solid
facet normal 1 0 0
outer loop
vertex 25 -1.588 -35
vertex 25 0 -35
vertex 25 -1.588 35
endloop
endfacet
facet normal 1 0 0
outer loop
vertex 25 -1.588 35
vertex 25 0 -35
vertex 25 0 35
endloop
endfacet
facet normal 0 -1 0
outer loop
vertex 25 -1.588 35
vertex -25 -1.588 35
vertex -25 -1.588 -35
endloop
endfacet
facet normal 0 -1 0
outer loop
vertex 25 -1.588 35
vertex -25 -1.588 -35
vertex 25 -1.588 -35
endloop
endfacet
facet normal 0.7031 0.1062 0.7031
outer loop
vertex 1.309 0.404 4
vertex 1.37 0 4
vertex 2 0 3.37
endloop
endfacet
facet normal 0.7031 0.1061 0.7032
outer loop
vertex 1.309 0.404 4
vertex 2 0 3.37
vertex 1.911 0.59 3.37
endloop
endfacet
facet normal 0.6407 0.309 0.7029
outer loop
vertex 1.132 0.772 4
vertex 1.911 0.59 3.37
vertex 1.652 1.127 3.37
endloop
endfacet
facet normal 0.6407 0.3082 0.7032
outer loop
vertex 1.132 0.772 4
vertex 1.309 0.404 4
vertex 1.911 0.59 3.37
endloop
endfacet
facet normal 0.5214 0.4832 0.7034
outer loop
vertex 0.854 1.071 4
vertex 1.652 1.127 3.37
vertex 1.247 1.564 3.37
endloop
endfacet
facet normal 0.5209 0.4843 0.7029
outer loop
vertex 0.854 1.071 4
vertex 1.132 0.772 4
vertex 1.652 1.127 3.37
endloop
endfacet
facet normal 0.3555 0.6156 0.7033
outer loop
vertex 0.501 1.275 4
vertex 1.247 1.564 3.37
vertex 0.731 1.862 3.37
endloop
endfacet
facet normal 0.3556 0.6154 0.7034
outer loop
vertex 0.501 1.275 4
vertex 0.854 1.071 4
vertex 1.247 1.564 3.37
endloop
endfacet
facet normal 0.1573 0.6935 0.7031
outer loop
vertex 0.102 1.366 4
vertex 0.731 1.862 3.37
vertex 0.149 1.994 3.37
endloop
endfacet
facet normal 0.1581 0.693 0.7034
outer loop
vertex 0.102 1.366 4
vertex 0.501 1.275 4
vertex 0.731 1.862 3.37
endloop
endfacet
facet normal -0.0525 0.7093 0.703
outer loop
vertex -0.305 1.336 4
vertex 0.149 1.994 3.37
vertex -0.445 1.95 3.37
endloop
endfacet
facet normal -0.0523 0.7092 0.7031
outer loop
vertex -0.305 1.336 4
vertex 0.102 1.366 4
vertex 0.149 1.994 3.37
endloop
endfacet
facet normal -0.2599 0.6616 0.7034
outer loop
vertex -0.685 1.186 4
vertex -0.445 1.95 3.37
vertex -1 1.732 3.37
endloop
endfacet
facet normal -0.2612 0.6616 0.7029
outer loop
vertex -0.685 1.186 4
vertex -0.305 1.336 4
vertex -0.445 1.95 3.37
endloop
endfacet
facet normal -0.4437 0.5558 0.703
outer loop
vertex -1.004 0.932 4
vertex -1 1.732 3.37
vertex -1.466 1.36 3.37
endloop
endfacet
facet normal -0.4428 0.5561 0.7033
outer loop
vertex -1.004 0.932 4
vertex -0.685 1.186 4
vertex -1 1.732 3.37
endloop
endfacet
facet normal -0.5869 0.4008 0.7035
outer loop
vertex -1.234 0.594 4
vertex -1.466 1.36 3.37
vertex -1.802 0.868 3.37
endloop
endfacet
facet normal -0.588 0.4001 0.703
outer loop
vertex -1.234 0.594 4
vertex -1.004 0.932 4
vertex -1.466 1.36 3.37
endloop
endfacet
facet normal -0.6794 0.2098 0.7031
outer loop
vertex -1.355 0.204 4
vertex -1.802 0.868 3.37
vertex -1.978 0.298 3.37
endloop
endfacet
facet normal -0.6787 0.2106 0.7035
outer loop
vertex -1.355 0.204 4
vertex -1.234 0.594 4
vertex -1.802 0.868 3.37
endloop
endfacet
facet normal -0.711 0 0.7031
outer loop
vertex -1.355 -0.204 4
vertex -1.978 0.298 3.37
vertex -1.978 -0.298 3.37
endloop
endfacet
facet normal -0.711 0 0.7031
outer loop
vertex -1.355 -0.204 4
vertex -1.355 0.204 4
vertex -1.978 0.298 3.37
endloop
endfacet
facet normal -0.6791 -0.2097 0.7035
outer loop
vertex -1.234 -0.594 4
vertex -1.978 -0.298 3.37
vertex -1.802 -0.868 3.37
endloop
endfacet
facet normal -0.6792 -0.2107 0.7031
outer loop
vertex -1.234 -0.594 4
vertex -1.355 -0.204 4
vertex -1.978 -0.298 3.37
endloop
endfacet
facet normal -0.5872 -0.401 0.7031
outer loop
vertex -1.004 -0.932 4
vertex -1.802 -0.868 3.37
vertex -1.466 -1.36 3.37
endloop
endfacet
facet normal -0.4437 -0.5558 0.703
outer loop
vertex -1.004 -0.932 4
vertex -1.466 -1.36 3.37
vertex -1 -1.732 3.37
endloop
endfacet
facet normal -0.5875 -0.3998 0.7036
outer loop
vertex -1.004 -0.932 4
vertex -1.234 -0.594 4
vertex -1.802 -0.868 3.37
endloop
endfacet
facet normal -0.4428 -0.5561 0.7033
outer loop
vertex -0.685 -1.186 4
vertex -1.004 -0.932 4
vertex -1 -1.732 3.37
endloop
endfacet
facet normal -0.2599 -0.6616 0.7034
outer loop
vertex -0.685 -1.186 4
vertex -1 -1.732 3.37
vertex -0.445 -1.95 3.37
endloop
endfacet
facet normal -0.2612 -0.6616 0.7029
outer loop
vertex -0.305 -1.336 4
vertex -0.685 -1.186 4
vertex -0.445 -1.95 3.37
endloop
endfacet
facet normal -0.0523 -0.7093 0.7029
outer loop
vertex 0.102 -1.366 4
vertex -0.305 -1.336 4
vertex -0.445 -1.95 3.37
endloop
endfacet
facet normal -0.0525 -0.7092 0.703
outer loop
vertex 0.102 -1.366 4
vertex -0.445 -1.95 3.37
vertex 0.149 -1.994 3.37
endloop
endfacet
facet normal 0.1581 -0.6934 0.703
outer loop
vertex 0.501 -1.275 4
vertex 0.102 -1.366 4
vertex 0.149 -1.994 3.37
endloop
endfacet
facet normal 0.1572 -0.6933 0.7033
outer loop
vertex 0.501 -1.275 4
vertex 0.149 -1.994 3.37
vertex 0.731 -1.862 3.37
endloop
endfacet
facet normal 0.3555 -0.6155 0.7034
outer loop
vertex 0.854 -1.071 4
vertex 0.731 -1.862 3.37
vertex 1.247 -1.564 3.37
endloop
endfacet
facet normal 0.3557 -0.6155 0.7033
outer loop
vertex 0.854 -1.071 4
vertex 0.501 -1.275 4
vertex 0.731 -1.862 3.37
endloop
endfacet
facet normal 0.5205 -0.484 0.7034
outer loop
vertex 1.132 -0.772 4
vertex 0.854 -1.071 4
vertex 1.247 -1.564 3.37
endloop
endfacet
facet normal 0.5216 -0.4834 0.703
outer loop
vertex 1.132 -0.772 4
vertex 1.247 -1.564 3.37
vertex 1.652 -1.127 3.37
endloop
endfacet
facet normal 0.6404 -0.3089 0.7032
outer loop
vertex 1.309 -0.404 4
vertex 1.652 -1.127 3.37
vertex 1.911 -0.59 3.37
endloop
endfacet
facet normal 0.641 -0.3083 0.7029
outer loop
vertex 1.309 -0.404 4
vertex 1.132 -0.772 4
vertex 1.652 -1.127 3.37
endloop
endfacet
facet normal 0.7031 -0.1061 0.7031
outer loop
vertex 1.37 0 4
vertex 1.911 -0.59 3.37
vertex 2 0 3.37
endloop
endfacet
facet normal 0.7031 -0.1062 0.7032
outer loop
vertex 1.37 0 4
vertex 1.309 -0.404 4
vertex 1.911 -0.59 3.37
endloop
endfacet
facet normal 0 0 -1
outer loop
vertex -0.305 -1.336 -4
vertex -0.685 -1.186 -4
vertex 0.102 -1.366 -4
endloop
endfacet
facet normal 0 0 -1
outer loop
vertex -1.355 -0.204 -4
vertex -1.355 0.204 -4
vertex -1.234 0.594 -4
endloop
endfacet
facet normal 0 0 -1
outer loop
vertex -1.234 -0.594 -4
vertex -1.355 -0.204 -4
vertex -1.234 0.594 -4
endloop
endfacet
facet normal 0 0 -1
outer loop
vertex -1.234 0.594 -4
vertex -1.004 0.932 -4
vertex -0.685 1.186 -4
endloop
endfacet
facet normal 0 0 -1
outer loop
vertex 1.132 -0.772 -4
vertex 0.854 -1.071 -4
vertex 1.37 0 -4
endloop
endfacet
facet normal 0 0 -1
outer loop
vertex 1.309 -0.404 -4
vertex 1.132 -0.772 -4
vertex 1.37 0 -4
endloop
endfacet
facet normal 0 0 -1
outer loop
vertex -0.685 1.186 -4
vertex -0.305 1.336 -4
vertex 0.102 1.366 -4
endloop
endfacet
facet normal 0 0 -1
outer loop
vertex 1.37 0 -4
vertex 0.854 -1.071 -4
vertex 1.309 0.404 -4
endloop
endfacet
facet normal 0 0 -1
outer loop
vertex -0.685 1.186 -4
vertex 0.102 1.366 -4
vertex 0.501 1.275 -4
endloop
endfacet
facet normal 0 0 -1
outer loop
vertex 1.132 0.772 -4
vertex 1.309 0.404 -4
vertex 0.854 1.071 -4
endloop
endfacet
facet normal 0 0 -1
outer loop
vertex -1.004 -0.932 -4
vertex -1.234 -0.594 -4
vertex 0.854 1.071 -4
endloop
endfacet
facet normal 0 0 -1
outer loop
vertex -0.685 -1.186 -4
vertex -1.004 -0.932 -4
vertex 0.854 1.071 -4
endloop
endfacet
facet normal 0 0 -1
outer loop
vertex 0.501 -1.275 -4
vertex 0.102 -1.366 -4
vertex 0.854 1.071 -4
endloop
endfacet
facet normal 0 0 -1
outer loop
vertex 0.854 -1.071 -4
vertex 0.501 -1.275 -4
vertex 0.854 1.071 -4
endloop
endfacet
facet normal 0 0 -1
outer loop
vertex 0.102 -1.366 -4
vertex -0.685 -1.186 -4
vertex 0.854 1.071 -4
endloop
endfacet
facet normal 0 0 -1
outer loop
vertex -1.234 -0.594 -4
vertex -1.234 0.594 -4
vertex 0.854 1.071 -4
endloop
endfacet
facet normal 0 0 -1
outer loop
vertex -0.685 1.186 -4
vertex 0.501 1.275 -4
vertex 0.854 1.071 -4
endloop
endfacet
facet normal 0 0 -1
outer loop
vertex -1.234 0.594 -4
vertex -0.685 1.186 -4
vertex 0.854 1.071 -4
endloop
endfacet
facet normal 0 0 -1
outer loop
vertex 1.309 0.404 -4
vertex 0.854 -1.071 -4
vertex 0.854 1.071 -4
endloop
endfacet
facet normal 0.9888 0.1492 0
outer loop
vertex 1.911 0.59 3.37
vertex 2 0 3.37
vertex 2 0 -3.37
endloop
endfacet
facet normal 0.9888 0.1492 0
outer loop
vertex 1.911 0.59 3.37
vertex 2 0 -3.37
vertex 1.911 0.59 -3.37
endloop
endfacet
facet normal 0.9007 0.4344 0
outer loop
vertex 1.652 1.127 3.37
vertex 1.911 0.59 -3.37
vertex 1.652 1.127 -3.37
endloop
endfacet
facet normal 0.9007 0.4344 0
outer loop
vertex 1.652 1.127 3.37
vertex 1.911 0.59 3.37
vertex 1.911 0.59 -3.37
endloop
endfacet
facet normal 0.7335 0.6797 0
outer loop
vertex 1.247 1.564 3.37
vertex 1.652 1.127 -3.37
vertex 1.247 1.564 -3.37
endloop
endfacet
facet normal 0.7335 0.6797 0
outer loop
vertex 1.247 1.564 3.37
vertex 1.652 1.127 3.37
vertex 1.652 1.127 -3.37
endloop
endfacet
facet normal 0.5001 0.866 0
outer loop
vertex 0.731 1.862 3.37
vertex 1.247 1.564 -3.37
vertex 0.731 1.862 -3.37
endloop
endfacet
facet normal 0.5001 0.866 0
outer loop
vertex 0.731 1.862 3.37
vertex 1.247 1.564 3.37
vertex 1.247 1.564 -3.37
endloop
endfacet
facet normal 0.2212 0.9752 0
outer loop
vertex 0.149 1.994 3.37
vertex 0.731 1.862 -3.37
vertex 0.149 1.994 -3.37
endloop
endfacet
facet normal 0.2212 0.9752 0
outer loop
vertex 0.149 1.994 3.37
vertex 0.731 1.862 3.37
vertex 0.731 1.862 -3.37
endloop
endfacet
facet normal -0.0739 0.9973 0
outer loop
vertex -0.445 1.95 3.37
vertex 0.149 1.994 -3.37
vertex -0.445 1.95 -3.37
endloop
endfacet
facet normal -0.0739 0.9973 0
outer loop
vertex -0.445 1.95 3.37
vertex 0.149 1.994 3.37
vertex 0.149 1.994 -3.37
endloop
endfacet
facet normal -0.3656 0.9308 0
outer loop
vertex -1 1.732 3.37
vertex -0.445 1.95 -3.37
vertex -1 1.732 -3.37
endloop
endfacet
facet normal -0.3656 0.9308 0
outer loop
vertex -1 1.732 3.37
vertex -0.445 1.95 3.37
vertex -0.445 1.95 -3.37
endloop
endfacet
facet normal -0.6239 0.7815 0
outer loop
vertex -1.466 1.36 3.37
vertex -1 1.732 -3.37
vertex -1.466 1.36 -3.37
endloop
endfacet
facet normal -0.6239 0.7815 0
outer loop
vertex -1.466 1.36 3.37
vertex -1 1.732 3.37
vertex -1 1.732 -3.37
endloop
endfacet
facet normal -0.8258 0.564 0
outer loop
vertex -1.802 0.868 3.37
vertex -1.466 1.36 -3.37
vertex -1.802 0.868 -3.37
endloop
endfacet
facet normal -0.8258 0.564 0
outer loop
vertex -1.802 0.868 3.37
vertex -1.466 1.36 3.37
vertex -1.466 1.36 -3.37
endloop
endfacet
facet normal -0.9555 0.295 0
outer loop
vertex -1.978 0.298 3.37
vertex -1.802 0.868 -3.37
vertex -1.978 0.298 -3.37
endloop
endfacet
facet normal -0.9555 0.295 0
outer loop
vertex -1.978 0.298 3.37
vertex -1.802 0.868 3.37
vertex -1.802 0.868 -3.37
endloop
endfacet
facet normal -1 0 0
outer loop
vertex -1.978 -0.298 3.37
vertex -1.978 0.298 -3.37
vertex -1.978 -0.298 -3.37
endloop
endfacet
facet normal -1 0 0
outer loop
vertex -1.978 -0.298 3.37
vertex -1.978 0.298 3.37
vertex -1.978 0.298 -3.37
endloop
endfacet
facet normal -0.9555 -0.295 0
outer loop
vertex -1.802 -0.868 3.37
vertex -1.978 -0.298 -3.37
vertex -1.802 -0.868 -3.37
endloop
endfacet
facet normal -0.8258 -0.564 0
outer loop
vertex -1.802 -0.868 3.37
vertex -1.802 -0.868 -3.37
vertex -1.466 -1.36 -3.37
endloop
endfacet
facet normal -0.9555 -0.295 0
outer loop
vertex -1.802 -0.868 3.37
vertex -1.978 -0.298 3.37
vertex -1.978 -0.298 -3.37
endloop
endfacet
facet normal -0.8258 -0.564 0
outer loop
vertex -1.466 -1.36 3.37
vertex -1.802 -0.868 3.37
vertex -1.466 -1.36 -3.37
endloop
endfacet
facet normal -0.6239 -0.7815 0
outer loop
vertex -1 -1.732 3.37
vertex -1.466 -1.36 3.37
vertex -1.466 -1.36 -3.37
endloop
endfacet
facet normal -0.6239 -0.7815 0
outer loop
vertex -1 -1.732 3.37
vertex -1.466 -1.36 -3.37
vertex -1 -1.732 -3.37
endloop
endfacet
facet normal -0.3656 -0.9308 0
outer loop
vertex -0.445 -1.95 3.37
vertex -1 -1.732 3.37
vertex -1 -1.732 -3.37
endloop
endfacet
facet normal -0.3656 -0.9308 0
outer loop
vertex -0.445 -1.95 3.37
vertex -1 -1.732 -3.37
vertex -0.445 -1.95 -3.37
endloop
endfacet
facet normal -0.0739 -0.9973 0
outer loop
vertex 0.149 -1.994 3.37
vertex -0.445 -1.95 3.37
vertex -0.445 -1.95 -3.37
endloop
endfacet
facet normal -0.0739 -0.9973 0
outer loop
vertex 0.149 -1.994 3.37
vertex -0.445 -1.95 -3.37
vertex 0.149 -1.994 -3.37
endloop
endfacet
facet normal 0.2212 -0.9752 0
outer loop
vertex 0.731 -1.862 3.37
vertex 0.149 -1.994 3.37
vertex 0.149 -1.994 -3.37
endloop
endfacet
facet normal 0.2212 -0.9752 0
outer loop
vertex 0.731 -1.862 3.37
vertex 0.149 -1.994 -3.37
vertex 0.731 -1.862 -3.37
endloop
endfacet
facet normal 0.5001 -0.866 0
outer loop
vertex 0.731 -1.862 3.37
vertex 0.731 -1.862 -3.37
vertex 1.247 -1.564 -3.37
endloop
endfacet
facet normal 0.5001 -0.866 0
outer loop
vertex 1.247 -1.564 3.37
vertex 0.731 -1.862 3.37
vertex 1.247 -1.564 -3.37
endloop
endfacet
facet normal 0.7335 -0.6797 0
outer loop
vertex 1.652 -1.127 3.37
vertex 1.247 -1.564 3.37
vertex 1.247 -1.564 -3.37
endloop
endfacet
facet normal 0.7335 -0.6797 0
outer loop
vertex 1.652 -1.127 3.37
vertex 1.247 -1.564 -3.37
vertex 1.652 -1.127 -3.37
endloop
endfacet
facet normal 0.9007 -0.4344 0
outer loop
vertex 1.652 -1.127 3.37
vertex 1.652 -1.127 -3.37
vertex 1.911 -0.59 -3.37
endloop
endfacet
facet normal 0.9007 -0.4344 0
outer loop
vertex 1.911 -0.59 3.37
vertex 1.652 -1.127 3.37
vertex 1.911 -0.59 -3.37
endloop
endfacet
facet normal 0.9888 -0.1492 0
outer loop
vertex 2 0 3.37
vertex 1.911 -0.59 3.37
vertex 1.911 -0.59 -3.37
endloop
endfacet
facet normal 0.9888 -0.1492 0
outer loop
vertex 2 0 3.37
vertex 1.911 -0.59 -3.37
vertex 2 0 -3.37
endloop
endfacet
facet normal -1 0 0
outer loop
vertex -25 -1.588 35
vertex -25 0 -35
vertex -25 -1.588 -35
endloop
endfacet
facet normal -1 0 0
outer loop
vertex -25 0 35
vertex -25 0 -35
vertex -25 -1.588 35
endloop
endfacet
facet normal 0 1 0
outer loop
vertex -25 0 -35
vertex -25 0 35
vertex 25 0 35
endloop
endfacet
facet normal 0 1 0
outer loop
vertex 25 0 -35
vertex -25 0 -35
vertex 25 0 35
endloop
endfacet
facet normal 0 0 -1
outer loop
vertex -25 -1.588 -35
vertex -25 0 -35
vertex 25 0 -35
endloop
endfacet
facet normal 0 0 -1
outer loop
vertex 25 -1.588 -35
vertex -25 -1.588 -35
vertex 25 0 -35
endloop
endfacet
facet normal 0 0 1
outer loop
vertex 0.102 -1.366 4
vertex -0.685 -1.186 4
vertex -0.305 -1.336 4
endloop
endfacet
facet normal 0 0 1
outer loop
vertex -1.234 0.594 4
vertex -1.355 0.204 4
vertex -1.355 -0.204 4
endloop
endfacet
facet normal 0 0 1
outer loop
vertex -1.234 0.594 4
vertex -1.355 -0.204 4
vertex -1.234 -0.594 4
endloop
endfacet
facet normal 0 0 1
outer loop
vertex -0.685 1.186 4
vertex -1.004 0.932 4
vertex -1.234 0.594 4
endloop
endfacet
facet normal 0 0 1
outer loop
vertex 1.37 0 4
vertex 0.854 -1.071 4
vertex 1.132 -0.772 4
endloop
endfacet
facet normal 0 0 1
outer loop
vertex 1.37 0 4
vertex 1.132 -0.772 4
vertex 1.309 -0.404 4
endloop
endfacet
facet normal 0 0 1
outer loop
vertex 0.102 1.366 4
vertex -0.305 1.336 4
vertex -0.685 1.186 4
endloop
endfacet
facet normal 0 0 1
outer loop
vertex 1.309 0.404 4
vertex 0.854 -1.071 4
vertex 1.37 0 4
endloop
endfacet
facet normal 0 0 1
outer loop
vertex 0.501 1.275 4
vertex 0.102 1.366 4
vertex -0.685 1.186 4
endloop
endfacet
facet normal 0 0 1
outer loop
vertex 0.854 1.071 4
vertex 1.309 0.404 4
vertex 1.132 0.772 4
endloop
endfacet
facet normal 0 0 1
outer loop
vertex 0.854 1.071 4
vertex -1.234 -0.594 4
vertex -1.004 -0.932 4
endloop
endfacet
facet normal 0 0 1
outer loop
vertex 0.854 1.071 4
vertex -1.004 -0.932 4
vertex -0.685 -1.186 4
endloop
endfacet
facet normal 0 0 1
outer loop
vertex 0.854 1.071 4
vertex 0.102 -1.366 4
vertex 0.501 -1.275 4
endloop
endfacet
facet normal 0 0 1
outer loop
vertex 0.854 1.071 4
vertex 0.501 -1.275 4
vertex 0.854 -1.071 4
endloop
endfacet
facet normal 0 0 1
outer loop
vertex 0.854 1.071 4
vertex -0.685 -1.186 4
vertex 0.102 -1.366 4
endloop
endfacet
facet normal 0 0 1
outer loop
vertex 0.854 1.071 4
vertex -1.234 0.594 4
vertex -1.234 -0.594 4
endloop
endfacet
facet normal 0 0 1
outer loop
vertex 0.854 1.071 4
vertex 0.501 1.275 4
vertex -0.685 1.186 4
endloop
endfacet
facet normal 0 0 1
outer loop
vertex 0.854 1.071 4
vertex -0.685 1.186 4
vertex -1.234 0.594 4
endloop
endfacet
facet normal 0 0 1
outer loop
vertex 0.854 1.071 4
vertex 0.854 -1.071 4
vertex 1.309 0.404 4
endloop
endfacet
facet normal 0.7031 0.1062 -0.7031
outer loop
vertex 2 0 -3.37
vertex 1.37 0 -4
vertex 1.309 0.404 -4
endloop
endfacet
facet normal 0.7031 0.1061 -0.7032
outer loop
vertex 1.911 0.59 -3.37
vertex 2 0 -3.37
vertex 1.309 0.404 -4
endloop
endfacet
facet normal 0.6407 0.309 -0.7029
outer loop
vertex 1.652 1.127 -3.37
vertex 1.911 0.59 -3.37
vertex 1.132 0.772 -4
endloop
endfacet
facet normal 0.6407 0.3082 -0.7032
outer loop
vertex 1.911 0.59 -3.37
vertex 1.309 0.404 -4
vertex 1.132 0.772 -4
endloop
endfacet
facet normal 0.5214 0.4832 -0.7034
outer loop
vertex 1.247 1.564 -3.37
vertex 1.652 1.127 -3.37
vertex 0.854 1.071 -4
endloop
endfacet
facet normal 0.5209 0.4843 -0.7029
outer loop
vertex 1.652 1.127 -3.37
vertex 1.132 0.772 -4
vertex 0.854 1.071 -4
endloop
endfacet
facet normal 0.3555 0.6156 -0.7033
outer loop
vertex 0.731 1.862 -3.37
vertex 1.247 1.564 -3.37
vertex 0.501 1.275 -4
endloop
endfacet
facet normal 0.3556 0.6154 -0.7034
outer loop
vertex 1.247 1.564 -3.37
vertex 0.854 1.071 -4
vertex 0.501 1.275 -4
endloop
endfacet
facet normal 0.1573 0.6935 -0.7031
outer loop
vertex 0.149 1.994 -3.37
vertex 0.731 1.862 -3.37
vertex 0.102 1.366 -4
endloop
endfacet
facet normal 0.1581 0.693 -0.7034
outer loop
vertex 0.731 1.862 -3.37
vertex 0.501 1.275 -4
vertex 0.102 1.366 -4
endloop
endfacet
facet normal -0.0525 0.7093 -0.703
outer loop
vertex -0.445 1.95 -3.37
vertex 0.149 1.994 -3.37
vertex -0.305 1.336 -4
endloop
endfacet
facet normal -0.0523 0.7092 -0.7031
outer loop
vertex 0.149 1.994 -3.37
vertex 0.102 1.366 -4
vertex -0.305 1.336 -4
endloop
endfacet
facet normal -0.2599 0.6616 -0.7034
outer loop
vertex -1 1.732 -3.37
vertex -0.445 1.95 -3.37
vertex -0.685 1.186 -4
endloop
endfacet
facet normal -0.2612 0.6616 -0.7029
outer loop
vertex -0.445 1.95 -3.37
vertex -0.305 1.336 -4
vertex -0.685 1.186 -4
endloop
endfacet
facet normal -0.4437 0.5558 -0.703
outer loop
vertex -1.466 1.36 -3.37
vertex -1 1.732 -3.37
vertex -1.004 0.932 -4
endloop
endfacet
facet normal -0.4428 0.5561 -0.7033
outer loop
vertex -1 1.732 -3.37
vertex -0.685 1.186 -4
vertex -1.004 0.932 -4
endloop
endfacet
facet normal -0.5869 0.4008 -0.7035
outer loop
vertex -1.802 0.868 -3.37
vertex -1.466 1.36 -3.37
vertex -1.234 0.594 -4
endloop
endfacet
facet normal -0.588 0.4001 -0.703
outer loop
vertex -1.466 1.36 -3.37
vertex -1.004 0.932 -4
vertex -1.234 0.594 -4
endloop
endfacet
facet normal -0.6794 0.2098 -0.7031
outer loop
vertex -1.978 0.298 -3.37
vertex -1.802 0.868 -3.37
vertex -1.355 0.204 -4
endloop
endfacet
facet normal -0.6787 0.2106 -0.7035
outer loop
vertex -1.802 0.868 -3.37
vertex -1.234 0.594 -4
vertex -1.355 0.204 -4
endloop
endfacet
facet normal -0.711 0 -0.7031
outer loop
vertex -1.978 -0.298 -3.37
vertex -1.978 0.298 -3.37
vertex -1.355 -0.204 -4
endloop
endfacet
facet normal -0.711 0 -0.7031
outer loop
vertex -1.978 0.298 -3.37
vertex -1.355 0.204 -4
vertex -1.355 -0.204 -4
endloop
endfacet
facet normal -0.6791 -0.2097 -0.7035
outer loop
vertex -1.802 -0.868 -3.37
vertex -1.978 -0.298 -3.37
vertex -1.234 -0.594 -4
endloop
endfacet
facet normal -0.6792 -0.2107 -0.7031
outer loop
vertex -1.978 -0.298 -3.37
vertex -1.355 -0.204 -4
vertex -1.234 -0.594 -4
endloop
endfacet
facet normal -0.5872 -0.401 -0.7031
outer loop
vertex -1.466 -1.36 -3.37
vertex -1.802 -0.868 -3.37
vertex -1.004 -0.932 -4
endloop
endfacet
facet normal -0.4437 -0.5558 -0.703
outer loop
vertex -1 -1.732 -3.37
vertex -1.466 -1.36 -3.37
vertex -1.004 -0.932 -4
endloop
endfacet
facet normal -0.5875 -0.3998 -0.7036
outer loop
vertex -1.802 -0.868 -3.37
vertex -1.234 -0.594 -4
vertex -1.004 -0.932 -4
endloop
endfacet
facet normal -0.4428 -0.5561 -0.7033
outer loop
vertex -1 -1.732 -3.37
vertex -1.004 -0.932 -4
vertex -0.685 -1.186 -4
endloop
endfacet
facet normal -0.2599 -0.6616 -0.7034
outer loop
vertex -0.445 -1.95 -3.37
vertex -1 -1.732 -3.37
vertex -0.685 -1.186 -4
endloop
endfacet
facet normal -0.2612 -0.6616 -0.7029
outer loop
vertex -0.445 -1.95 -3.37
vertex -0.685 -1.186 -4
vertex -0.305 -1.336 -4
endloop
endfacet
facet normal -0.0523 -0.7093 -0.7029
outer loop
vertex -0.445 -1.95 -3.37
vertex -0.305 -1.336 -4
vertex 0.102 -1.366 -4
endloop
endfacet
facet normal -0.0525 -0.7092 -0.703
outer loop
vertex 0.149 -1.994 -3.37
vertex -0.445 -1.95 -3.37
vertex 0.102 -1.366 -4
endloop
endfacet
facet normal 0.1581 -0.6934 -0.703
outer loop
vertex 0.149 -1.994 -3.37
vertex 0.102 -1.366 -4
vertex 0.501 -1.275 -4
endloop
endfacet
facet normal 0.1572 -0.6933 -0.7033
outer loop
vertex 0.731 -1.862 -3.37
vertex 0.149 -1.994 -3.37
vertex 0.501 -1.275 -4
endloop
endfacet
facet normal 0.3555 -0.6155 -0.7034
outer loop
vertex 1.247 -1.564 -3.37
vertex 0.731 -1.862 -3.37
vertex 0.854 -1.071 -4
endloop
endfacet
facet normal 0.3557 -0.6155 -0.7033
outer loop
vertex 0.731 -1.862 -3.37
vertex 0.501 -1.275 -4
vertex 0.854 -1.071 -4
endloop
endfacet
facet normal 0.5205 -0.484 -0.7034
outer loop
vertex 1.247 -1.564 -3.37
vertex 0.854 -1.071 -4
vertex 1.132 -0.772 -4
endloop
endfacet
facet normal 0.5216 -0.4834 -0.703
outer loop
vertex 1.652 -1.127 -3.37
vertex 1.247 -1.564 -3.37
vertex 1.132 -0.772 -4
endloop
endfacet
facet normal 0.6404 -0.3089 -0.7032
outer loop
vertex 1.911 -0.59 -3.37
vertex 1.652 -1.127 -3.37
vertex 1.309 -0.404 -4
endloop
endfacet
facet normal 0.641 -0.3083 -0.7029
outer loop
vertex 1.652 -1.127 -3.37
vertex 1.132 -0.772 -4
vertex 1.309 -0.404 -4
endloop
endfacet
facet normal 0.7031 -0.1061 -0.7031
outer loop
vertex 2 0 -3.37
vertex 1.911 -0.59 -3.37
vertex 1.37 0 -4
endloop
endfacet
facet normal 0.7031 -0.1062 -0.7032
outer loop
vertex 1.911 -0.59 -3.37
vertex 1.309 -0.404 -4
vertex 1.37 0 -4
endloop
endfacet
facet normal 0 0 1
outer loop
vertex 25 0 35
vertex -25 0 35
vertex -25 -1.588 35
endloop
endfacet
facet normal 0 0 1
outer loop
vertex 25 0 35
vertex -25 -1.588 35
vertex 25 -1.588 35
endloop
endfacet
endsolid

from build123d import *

# Parameters (mm, degrees)
F0_R     = 2
F1_DEPTH = 4
F2_SIZE  = 0.63
F3_W     = 50
F3_H     = 70
F4_DEPTH = 1.5875


# Not quite as in the source:
# - a length typed as a fraction of an inch, garbled in the dataset ("3 / 203.2 mm" for 3/8 in), is restored


with BuildPart() as f1:
    # F0 (on Top) → F1 (new body, symmetric)
    with BuildSketch(Plane.XY):
        Circle(F0_R)
    extrude(amount=F1_DEPTH, both=True)

    # F2
    f2_edges = [f1.edges().sort_by_distance(p)[0] for p in [
        (-2, 0, 4),
        (-2, 0, -4),
    ]]
    chamfer(f2_edges, length=F2_SIZE)


with BuildPart() as f4:
    # F3 (on Front) → F4 (new body)
    with BuildSketch(Plane.XZ):
        Rectangle(F3_W, F3_H)
    extrude(amount=F4_DEPTH)


solid = Compound([f1.part, f4.part])
